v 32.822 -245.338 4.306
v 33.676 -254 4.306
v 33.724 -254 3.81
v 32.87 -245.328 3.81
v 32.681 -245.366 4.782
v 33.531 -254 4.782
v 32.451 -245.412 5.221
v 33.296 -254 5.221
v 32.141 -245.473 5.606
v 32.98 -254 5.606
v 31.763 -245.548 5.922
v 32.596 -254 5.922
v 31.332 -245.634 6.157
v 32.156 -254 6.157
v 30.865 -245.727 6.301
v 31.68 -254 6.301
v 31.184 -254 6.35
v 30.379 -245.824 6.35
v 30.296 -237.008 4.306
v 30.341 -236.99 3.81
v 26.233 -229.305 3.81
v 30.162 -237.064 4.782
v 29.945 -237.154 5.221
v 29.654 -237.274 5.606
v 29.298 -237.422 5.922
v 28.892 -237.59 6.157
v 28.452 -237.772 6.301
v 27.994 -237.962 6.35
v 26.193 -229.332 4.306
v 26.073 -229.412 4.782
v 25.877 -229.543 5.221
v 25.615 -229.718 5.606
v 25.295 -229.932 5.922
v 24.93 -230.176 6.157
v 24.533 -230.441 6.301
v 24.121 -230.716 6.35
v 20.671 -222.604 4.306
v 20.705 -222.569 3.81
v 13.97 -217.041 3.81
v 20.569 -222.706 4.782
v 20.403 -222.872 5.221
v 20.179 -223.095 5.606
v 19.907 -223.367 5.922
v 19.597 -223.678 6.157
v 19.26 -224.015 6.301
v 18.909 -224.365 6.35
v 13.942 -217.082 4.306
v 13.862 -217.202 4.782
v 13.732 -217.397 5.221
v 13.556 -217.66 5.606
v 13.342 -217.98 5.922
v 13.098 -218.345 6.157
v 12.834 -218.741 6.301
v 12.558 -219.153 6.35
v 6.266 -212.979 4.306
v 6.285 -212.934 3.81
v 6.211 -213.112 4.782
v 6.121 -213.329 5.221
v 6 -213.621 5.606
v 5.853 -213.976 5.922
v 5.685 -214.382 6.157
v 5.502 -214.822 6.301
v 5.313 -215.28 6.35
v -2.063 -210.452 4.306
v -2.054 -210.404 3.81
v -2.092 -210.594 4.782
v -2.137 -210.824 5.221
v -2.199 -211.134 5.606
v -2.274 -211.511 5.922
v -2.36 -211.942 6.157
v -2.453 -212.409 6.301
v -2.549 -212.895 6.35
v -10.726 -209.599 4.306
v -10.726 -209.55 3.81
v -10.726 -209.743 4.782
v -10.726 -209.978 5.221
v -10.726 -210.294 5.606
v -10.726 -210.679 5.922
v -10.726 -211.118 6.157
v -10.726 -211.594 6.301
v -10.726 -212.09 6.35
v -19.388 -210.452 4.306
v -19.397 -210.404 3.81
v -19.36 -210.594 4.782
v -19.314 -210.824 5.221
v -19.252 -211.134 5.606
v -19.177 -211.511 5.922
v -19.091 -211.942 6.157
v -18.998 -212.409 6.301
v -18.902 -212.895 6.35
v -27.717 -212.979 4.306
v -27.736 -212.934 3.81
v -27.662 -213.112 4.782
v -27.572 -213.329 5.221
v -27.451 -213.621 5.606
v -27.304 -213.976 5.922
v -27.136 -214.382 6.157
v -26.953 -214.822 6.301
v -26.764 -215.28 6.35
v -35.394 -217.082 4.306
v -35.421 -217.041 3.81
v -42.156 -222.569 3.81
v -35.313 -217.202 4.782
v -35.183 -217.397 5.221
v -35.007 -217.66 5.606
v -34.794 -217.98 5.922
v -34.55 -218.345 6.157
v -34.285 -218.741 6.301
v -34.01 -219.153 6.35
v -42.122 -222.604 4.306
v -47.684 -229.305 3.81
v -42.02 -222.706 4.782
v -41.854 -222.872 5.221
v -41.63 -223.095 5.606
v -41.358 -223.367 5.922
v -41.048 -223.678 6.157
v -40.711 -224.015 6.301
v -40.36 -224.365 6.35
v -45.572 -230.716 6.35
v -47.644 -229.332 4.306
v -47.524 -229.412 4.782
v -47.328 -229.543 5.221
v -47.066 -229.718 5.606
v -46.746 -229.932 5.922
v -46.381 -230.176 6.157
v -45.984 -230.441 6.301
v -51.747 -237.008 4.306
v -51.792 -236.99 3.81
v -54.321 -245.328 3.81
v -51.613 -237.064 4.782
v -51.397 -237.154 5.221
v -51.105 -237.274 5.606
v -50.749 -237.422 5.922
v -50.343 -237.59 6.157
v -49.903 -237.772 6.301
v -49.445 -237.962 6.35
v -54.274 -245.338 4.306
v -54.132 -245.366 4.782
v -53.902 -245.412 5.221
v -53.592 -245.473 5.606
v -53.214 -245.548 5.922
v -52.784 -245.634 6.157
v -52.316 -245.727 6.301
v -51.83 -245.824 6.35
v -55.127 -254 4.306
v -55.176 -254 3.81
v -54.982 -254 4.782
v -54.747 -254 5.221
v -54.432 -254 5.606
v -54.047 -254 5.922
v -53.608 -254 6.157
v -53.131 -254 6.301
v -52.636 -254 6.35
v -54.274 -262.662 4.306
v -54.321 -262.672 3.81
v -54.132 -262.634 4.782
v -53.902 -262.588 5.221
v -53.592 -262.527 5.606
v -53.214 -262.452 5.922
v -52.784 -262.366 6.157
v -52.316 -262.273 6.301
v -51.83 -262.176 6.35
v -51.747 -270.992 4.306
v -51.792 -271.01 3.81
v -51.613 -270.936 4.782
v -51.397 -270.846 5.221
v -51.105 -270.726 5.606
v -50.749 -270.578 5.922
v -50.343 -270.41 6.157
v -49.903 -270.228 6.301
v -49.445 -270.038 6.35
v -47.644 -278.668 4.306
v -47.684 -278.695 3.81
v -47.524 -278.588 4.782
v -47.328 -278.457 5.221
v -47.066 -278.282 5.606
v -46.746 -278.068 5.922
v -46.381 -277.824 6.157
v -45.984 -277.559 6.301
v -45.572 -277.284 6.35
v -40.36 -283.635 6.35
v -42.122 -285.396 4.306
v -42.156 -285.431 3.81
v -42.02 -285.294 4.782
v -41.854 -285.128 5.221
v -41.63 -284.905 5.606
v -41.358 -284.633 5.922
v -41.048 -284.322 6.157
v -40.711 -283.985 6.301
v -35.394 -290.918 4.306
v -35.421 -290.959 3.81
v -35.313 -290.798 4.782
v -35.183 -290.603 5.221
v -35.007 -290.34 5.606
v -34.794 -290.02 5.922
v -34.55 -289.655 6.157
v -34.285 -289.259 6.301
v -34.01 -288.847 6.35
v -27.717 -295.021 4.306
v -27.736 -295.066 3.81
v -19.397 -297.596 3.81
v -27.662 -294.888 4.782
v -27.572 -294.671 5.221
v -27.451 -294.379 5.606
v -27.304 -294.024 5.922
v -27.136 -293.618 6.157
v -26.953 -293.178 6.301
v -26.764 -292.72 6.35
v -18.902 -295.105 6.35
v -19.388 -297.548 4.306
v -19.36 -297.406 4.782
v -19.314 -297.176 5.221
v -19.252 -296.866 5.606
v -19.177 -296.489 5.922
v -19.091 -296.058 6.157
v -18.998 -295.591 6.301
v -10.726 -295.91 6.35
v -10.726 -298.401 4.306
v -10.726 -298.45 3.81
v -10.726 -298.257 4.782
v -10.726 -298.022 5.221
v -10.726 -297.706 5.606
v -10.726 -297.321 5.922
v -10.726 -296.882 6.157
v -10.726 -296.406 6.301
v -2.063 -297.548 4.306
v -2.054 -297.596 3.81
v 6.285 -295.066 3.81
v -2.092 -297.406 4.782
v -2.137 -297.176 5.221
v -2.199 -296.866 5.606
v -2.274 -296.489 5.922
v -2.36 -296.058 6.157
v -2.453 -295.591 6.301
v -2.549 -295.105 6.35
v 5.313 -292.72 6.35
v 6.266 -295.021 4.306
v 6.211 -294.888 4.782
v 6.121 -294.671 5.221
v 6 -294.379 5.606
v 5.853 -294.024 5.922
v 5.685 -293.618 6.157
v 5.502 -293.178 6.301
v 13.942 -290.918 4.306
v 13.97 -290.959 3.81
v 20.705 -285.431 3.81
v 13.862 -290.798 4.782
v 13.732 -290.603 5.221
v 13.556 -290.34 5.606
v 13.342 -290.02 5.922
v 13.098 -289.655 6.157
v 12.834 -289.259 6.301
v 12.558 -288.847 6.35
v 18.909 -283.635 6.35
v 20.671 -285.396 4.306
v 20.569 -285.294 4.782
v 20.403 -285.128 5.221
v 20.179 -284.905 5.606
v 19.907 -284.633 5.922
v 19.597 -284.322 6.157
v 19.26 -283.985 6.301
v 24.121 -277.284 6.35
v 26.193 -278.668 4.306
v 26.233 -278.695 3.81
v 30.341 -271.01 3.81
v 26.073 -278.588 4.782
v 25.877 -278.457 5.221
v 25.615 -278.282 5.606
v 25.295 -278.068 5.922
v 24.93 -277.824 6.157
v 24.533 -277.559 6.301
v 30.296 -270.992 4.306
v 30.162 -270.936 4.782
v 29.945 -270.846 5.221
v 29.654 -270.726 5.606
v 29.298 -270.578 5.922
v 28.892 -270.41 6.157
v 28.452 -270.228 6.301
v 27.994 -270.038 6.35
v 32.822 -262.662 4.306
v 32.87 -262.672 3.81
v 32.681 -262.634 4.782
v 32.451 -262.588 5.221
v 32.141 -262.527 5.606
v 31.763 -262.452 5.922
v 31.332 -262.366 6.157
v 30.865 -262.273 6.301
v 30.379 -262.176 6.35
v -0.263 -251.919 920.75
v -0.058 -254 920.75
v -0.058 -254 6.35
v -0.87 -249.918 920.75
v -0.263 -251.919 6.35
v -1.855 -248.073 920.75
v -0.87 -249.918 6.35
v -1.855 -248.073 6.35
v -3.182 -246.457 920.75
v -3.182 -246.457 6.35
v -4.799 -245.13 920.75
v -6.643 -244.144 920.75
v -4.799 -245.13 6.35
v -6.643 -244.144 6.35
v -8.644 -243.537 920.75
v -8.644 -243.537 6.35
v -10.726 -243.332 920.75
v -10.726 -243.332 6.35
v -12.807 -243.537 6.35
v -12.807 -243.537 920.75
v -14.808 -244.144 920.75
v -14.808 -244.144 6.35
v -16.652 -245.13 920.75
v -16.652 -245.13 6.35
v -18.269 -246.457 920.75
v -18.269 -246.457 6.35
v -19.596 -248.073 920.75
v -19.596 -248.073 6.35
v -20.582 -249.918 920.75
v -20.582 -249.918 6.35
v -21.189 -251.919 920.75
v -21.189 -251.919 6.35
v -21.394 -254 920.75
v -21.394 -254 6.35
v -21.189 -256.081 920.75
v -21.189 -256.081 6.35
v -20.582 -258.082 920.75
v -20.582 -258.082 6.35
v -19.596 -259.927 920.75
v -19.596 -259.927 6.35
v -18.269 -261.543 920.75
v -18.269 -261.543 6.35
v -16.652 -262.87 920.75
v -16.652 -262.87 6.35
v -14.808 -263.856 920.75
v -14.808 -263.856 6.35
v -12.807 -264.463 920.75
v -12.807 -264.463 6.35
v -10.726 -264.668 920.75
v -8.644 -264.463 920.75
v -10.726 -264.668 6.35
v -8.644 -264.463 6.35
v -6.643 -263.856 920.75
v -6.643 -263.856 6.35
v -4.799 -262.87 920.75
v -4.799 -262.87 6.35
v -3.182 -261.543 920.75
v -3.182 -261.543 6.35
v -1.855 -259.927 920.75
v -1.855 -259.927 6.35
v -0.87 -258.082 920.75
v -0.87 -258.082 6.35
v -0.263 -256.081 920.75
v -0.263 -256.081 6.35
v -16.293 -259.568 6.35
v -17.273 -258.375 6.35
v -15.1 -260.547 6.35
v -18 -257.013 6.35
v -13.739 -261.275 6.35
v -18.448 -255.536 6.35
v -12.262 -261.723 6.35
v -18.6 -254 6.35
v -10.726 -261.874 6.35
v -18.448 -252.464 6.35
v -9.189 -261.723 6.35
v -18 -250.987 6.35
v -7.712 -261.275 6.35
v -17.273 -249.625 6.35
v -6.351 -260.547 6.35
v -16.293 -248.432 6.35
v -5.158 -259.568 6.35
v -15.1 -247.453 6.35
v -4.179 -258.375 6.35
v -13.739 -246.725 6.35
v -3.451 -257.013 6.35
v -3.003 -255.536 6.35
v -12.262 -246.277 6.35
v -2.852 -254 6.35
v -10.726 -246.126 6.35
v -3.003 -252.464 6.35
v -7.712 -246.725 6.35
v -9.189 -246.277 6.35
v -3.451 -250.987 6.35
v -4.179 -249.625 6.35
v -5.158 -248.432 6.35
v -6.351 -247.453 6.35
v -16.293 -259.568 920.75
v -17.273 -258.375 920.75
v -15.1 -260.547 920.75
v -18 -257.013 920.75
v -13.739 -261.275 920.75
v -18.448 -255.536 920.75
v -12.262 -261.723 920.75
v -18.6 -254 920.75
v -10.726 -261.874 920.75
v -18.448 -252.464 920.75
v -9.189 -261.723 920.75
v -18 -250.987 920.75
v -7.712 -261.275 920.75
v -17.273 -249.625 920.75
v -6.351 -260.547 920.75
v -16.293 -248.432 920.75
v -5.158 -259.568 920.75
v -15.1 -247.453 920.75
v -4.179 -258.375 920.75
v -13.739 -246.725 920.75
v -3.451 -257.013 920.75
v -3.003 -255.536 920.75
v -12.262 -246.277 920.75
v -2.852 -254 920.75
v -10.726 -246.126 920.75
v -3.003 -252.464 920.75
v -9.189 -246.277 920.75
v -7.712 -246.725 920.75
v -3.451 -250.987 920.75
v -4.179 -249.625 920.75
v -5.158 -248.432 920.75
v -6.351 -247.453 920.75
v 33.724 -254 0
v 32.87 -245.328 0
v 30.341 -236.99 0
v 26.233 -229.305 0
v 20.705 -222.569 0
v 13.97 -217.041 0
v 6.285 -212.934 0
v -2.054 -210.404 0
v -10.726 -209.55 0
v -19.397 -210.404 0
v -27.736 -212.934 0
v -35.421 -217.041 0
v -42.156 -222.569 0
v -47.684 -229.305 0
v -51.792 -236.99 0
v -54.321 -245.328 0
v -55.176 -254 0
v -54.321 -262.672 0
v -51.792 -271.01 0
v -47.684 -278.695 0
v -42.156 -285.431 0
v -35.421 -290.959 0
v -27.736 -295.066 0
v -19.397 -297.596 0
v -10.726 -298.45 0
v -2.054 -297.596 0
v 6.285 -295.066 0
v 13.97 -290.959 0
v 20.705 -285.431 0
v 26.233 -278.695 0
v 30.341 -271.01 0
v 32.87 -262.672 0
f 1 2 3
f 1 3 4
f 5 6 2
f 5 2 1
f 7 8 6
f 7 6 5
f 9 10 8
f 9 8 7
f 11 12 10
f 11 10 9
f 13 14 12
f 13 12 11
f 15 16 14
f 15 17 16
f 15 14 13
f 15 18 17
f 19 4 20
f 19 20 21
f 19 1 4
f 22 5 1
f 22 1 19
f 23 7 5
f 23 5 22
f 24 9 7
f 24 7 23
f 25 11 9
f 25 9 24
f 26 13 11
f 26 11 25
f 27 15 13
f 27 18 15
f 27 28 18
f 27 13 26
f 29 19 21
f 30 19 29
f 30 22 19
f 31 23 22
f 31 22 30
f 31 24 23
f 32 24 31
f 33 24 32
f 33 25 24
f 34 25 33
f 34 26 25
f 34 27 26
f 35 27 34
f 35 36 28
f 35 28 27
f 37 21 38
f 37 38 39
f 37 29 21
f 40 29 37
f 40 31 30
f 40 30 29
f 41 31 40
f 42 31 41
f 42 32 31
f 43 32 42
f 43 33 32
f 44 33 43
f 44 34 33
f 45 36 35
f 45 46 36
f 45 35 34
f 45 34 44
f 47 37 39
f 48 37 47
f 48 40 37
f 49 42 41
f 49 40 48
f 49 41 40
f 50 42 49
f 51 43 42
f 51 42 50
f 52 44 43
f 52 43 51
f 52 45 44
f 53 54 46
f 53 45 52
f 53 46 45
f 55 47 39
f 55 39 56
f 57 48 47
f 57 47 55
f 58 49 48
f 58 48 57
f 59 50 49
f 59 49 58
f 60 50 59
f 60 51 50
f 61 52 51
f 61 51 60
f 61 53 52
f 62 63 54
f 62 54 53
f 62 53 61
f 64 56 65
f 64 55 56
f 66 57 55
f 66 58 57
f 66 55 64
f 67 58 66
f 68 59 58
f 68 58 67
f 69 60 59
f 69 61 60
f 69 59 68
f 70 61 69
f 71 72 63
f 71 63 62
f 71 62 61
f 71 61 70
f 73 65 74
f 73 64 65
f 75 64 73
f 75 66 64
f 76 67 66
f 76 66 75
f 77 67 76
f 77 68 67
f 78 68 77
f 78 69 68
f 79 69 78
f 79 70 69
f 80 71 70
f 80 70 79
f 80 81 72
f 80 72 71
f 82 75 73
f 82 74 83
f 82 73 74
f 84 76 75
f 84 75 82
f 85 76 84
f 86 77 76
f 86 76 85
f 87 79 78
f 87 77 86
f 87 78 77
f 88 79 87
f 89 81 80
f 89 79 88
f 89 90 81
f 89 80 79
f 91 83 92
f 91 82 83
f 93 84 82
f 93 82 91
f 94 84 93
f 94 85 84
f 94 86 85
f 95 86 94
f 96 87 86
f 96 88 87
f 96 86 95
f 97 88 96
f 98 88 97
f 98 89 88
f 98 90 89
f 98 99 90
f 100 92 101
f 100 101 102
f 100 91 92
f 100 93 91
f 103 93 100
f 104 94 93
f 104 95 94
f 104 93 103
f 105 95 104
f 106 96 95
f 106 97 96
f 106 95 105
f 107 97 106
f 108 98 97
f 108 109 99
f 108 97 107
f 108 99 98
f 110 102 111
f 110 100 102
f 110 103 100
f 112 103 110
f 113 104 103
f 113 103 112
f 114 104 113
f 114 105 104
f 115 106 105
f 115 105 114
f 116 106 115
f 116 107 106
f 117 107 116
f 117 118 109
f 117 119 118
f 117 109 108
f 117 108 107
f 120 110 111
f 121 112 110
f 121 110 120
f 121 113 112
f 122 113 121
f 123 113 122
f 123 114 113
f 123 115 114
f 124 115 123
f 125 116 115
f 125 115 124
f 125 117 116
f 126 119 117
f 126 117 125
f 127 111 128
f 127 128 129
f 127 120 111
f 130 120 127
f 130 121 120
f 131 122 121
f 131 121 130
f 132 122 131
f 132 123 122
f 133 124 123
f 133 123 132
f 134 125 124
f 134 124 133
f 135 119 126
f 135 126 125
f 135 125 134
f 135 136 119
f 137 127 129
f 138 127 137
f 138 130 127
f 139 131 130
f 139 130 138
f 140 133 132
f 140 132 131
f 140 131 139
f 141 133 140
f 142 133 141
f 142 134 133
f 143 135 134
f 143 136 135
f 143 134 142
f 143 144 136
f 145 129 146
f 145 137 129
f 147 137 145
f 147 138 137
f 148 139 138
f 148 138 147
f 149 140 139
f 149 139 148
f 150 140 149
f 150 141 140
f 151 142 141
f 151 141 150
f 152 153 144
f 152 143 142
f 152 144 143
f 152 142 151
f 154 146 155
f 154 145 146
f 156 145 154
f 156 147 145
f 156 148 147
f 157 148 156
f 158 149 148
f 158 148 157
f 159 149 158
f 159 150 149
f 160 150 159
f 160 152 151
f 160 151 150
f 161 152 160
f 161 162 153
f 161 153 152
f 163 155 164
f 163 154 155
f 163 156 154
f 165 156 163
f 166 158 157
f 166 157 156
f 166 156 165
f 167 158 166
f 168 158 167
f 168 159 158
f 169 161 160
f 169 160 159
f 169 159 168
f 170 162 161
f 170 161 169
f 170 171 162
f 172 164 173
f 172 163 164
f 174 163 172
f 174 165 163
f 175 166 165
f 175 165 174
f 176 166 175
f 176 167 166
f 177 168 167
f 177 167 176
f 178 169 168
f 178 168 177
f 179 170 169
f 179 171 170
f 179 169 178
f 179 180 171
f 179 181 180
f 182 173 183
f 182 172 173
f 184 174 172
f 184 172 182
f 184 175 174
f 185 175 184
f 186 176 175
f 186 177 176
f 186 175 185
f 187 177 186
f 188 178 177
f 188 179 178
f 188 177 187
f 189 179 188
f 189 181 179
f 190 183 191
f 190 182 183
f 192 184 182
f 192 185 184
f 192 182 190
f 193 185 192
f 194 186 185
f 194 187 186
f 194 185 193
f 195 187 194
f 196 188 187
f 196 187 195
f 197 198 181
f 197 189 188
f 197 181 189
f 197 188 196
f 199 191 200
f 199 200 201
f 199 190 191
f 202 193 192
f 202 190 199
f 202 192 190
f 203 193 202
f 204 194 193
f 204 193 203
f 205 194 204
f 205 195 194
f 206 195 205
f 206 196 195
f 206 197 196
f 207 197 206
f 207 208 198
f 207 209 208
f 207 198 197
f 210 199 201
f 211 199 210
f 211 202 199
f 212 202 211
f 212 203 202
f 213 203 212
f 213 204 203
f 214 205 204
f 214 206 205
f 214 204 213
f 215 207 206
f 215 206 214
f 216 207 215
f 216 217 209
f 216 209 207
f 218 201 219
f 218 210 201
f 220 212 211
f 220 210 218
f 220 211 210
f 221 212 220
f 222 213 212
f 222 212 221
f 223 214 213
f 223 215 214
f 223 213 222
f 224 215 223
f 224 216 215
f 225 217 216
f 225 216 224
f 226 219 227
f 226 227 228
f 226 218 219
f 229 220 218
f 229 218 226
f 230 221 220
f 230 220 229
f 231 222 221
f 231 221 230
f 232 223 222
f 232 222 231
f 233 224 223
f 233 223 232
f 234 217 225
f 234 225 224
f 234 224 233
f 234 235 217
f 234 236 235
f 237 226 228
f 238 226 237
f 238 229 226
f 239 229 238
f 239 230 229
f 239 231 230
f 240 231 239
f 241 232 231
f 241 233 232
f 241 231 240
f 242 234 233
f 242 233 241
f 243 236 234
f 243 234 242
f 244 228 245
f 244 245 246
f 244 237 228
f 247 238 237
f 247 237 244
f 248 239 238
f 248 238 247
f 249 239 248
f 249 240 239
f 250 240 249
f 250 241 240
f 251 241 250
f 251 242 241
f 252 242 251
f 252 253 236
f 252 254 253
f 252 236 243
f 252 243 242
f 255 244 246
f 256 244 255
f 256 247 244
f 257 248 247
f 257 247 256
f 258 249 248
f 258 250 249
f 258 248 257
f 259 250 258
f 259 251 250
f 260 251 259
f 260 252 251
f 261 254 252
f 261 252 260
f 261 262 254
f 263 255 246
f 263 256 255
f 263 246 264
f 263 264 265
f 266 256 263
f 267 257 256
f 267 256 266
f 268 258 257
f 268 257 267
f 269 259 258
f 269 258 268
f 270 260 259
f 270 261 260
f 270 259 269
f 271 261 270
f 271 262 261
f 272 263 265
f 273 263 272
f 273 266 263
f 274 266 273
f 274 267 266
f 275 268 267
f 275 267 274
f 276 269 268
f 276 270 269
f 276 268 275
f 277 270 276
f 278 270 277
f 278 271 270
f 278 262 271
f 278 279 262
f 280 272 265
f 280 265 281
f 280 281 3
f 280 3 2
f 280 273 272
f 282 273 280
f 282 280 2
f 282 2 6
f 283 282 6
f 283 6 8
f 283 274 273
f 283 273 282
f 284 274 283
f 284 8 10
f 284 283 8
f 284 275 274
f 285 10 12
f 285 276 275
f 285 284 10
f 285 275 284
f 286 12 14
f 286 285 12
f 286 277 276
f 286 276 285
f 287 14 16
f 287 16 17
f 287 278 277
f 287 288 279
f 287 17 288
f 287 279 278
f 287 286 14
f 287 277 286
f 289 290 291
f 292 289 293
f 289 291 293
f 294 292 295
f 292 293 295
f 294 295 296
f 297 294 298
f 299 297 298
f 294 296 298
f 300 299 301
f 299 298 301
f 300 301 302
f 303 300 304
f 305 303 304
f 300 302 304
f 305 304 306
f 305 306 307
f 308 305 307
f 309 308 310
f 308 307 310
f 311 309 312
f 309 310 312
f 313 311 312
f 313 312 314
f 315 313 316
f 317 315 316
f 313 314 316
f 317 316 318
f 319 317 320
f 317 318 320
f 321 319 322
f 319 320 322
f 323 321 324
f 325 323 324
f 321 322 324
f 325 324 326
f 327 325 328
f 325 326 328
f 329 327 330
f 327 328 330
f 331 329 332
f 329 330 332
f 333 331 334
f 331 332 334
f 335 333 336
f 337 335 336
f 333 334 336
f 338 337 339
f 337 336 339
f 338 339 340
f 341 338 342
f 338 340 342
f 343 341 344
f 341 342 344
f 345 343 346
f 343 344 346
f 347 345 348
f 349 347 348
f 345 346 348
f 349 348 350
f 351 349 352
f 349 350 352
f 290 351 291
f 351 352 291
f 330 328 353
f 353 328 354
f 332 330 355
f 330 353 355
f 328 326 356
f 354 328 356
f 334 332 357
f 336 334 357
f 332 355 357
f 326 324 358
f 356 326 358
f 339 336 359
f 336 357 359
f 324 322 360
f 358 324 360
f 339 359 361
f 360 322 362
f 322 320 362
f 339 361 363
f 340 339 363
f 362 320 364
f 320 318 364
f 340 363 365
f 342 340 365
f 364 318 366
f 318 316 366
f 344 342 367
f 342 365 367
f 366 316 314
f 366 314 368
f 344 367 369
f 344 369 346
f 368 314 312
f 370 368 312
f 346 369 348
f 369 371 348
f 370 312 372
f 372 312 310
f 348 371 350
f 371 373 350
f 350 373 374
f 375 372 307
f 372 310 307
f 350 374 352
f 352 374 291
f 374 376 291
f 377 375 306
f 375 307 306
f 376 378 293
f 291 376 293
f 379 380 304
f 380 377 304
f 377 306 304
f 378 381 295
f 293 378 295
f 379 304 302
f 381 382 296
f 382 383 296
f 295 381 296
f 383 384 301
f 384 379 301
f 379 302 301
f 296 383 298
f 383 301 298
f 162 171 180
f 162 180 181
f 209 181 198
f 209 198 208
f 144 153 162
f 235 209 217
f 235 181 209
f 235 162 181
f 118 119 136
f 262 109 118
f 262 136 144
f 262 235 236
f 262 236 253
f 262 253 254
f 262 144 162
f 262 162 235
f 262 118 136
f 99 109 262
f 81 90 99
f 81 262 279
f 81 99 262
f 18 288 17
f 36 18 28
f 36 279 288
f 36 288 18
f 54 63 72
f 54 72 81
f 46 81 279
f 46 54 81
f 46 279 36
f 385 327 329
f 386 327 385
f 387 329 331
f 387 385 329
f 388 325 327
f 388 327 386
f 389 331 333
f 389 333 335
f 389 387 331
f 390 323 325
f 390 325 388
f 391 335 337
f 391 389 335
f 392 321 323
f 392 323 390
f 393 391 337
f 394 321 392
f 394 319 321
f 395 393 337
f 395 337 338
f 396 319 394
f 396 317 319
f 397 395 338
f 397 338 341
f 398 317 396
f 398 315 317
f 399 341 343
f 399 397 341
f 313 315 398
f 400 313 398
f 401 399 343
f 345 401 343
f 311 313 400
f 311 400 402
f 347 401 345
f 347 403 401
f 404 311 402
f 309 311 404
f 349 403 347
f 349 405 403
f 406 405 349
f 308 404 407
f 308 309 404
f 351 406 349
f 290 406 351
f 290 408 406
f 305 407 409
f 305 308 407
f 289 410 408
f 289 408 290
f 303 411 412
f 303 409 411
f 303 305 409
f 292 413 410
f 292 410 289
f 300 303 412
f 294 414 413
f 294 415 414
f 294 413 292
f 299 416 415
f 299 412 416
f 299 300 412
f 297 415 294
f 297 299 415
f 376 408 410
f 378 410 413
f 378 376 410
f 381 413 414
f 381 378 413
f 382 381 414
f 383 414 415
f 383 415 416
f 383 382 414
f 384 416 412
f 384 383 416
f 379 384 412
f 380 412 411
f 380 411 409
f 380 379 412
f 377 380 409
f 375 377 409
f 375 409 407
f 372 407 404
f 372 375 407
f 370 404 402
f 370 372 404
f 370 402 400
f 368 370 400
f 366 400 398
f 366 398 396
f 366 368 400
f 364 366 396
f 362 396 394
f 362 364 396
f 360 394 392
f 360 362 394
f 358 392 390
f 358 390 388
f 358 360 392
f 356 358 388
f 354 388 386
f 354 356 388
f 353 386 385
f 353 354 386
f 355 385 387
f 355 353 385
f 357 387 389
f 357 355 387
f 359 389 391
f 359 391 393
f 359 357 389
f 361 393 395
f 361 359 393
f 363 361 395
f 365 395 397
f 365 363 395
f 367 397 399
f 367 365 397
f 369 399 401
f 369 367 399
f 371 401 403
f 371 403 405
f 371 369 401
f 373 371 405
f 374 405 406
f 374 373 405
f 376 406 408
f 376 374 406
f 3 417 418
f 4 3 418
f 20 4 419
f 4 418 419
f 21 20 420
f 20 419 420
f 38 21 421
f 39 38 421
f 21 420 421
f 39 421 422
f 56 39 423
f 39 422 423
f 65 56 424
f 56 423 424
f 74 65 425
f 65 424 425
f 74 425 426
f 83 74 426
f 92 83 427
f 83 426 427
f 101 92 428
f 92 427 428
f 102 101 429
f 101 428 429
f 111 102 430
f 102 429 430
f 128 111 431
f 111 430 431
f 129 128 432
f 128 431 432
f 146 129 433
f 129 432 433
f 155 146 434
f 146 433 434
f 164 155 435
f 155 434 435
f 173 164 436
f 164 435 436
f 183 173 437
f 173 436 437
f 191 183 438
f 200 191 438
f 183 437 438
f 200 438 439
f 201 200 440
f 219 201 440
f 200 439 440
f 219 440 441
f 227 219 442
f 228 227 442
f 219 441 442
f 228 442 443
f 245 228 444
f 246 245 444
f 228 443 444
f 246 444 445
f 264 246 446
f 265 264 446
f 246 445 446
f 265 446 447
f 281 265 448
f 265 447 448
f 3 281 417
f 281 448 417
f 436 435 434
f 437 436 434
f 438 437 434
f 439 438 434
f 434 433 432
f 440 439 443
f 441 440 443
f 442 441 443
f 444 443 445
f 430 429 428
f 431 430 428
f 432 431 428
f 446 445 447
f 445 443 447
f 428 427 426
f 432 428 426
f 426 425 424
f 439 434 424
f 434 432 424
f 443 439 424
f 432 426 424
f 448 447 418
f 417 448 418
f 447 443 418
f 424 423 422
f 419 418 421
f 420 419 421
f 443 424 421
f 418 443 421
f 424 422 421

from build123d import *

# Parameters (mm, degrees)
F0_R     = 44.45
F1_DEPTH = 6.35
F2_R     = 2.54
F3_R     = 10.668
F3_R_2   = 7.874
F4_DEPTH = 914.4


with BuildPart() as f1:
    # F0 (on Top) → F1 (new body)
    with BuildSketch(Plane.XY):
        with Locations((-10.725561, -254)):
            Circle(F0_R)
    extrude(amount=F1_DEPTH)

    # F2
    f2_edges = [f1.edges().sort_by_distance(p)[0] for p in [
        (-55.175561, -254, 6.35),
    ]]
    fillet(f2_edges, radius=F2_R)


with BuildPart() as f4:
    # F3 (on face) → F4 (new body)
    with BuildSketch(Plane.XY.offset(6.35)):
        with Locations((-10.725561, -254)):
            Circle(F3_R)
        with Locations((-10.725561, -254)):
            Circle(F3_R_2, mode=Mode.SUBTRACT)
    extrude(amount=F4_DEPTH)


solid = Compound([f1.part, f4.part])
